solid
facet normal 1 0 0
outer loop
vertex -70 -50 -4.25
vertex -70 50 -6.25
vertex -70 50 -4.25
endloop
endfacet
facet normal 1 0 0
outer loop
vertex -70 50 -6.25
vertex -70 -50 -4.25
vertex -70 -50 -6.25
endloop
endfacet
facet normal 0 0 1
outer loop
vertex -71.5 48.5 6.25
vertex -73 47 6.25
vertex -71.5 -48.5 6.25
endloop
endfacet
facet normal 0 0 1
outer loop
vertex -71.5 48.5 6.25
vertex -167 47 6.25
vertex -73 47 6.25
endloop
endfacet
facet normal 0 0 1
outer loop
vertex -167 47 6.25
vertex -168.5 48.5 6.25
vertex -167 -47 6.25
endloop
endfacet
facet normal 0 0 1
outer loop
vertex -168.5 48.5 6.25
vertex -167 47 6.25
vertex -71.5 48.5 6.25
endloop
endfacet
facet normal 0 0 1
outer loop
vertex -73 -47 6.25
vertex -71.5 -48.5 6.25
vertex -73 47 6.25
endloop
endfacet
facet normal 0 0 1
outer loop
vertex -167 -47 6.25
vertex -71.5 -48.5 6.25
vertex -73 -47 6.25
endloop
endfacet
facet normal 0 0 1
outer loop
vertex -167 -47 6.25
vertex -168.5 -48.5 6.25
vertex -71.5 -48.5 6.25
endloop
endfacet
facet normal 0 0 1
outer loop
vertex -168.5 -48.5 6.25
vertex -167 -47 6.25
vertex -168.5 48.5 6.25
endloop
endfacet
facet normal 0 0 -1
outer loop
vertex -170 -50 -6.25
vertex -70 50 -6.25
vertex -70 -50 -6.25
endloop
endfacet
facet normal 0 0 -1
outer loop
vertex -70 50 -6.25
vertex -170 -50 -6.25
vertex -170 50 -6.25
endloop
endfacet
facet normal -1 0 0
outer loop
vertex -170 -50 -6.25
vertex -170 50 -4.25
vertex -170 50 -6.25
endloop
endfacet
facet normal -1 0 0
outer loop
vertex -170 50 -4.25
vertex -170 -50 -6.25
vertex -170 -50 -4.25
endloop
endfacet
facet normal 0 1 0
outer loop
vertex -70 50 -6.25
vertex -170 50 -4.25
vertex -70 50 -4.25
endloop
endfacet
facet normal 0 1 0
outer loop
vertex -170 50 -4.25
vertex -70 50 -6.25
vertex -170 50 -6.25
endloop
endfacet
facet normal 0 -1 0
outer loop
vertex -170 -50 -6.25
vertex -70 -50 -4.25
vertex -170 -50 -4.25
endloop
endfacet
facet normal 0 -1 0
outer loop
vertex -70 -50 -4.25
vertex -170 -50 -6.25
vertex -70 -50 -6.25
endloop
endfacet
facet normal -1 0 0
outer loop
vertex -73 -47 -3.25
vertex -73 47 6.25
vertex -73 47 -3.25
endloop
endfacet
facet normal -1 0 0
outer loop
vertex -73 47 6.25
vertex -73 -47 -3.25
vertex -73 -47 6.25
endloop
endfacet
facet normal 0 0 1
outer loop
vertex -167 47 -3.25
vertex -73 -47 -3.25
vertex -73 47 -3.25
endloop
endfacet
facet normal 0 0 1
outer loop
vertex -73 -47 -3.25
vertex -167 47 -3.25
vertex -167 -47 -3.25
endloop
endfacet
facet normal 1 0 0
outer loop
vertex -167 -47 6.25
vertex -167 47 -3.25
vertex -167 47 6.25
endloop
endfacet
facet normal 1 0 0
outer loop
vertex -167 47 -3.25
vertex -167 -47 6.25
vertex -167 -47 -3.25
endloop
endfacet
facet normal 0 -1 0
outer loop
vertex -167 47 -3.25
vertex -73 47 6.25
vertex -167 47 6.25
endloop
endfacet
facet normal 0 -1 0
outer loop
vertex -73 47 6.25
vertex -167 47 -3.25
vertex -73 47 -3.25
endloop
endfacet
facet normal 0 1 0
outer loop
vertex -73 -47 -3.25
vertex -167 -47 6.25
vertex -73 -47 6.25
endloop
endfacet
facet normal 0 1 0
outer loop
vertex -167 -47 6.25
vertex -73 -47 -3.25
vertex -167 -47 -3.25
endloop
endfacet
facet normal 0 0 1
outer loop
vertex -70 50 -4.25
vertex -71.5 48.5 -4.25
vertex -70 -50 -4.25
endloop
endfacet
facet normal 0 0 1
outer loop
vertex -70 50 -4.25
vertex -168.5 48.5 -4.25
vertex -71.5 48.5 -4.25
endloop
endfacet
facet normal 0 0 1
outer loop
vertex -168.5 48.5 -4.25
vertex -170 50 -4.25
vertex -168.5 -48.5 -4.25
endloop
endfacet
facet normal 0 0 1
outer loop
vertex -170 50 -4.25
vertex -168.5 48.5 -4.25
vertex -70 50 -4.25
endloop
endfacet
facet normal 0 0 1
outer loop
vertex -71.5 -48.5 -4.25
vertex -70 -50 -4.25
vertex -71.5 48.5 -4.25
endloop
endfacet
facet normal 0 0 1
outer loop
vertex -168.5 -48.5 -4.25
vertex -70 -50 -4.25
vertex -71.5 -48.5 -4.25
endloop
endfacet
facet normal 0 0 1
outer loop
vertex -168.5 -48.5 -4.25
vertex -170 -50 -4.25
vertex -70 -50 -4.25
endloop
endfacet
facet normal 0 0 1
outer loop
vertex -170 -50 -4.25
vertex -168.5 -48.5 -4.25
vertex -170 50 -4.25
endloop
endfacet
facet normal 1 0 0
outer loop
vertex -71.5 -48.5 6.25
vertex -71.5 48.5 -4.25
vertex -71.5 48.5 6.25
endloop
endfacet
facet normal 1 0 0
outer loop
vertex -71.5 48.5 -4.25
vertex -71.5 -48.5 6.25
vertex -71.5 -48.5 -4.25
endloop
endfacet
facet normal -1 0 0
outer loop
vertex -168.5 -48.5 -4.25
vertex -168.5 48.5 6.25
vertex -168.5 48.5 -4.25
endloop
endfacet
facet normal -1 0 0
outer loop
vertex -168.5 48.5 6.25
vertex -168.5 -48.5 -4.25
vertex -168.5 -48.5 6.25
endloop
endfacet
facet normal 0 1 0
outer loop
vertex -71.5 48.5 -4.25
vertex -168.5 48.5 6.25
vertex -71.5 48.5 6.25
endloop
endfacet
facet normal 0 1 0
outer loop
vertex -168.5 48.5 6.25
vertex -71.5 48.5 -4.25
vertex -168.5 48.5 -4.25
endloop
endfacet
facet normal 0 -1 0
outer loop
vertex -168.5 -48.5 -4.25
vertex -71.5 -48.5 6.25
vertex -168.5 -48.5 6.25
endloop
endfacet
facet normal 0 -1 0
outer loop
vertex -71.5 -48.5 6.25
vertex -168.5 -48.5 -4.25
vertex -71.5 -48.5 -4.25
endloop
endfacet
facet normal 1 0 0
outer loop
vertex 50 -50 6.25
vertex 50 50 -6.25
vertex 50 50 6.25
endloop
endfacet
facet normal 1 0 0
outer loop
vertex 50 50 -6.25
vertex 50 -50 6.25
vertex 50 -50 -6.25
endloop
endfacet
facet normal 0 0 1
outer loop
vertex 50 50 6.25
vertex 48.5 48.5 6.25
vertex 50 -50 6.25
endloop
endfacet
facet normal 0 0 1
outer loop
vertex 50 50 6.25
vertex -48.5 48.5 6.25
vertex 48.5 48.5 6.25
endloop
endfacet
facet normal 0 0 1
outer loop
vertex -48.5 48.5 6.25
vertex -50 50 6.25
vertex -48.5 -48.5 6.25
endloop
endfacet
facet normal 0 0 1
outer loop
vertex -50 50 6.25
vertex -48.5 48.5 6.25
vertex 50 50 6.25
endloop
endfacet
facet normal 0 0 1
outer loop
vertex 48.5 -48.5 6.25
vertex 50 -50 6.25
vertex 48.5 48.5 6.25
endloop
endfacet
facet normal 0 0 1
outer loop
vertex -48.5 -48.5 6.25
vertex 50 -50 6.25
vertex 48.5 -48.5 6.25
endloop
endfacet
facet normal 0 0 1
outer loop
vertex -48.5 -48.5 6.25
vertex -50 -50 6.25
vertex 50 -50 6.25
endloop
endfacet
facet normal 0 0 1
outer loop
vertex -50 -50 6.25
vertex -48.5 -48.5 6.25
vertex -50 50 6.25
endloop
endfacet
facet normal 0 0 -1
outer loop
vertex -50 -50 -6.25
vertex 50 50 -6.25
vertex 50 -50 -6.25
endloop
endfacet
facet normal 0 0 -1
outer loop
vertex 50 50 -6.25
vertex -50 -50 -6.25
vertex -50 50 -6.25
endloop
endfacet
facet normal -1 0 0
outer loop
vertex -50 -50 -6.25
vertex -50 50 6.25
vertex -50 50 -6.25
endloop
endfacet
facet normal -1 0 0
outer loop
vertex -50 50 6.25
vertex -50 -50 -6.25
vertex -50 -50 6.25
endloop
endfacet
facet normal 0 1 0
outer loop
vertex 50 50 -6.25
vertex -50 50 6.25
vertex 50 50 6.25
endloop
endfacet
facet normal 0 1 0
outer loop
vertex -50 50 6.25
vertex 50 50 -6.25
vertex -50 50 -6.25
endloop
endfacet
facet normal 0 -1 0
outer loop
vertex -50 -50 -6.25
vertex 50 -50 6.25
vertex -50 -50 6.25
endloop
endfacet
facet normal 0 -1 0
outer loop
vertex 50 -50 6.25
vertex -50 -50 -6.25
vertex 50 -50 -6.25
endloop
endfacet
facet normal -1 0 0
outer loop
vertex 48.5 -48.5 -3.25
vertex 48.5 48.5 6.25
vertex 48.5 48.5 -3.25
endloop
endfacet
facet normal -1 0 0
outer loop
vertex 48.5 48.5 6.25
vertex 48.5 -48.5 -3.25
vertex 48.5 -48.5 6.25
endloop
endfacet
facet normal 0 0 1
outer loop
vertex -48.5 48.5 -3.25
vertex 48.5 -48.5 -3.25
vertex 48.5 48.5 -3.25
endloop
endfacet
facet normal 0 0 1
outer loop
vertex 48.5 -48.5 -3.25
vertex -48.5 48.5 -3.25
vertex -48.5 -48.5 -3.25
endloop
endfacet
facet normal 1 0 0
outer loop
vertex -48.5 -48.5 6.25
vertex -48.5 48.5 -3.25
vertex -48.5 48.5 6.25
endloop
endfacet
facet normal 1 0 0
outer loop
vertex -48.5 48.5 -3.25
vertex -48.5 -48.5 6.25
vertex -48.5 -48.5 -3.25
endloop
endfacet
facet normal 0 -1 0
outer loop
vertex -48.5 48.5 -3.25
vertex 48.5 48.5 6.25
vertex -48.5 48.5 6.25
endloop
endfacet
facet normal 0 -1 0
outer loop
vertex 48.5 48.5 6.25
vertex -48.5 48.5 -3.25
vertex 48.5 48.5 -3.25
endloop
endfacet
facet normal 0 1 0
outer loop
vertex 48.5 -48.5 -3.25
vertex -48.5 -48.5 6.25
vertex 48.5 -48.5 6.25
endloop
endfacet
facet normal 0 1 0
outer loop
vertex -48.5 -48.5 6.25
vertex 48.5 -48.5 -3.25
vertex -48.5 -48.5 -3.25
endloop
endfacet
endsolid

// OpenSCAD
krab_dlzka = 100 ;
krab_sirka = 100;
krab_hrubka = 12.5;

//komponenty: arduino 2 psouvne a 2 otocne potenciometre 
module 1_polka(){
   difference(){
    cube([krab_dlzka,krab_sirka,krab_hrubka], true);
    translate([0,0,3])
     cube([krab_dlzka - 3,krab_sirka - 3,krab_hrubka], true);
   }
}




module p(){
        difference(){
        cube([krab_dlzka,krab_sirka,krab_hrubka], true);
        translate([0,0,3])
         cube([krab_dlzka - 6,krab_sirka - 6,krab_hrubka], true);
       }
    }

module d(){
       difference(){
       cube([krab_dlzka+0.01,krab_sirka+0.01,krab_hrubka+2], true);
       cube([krab_dlzka-3,krab_sirka-3,krab_hrubka+4], true);
       }
   }
   
 module 2_polka(){
    difference(){
        p();
        translate([0,0,3])
        d();
    }
   
}

module krabica(){
translate([-120,0,0])
2_polka();
1_polka();
}

krabica();
